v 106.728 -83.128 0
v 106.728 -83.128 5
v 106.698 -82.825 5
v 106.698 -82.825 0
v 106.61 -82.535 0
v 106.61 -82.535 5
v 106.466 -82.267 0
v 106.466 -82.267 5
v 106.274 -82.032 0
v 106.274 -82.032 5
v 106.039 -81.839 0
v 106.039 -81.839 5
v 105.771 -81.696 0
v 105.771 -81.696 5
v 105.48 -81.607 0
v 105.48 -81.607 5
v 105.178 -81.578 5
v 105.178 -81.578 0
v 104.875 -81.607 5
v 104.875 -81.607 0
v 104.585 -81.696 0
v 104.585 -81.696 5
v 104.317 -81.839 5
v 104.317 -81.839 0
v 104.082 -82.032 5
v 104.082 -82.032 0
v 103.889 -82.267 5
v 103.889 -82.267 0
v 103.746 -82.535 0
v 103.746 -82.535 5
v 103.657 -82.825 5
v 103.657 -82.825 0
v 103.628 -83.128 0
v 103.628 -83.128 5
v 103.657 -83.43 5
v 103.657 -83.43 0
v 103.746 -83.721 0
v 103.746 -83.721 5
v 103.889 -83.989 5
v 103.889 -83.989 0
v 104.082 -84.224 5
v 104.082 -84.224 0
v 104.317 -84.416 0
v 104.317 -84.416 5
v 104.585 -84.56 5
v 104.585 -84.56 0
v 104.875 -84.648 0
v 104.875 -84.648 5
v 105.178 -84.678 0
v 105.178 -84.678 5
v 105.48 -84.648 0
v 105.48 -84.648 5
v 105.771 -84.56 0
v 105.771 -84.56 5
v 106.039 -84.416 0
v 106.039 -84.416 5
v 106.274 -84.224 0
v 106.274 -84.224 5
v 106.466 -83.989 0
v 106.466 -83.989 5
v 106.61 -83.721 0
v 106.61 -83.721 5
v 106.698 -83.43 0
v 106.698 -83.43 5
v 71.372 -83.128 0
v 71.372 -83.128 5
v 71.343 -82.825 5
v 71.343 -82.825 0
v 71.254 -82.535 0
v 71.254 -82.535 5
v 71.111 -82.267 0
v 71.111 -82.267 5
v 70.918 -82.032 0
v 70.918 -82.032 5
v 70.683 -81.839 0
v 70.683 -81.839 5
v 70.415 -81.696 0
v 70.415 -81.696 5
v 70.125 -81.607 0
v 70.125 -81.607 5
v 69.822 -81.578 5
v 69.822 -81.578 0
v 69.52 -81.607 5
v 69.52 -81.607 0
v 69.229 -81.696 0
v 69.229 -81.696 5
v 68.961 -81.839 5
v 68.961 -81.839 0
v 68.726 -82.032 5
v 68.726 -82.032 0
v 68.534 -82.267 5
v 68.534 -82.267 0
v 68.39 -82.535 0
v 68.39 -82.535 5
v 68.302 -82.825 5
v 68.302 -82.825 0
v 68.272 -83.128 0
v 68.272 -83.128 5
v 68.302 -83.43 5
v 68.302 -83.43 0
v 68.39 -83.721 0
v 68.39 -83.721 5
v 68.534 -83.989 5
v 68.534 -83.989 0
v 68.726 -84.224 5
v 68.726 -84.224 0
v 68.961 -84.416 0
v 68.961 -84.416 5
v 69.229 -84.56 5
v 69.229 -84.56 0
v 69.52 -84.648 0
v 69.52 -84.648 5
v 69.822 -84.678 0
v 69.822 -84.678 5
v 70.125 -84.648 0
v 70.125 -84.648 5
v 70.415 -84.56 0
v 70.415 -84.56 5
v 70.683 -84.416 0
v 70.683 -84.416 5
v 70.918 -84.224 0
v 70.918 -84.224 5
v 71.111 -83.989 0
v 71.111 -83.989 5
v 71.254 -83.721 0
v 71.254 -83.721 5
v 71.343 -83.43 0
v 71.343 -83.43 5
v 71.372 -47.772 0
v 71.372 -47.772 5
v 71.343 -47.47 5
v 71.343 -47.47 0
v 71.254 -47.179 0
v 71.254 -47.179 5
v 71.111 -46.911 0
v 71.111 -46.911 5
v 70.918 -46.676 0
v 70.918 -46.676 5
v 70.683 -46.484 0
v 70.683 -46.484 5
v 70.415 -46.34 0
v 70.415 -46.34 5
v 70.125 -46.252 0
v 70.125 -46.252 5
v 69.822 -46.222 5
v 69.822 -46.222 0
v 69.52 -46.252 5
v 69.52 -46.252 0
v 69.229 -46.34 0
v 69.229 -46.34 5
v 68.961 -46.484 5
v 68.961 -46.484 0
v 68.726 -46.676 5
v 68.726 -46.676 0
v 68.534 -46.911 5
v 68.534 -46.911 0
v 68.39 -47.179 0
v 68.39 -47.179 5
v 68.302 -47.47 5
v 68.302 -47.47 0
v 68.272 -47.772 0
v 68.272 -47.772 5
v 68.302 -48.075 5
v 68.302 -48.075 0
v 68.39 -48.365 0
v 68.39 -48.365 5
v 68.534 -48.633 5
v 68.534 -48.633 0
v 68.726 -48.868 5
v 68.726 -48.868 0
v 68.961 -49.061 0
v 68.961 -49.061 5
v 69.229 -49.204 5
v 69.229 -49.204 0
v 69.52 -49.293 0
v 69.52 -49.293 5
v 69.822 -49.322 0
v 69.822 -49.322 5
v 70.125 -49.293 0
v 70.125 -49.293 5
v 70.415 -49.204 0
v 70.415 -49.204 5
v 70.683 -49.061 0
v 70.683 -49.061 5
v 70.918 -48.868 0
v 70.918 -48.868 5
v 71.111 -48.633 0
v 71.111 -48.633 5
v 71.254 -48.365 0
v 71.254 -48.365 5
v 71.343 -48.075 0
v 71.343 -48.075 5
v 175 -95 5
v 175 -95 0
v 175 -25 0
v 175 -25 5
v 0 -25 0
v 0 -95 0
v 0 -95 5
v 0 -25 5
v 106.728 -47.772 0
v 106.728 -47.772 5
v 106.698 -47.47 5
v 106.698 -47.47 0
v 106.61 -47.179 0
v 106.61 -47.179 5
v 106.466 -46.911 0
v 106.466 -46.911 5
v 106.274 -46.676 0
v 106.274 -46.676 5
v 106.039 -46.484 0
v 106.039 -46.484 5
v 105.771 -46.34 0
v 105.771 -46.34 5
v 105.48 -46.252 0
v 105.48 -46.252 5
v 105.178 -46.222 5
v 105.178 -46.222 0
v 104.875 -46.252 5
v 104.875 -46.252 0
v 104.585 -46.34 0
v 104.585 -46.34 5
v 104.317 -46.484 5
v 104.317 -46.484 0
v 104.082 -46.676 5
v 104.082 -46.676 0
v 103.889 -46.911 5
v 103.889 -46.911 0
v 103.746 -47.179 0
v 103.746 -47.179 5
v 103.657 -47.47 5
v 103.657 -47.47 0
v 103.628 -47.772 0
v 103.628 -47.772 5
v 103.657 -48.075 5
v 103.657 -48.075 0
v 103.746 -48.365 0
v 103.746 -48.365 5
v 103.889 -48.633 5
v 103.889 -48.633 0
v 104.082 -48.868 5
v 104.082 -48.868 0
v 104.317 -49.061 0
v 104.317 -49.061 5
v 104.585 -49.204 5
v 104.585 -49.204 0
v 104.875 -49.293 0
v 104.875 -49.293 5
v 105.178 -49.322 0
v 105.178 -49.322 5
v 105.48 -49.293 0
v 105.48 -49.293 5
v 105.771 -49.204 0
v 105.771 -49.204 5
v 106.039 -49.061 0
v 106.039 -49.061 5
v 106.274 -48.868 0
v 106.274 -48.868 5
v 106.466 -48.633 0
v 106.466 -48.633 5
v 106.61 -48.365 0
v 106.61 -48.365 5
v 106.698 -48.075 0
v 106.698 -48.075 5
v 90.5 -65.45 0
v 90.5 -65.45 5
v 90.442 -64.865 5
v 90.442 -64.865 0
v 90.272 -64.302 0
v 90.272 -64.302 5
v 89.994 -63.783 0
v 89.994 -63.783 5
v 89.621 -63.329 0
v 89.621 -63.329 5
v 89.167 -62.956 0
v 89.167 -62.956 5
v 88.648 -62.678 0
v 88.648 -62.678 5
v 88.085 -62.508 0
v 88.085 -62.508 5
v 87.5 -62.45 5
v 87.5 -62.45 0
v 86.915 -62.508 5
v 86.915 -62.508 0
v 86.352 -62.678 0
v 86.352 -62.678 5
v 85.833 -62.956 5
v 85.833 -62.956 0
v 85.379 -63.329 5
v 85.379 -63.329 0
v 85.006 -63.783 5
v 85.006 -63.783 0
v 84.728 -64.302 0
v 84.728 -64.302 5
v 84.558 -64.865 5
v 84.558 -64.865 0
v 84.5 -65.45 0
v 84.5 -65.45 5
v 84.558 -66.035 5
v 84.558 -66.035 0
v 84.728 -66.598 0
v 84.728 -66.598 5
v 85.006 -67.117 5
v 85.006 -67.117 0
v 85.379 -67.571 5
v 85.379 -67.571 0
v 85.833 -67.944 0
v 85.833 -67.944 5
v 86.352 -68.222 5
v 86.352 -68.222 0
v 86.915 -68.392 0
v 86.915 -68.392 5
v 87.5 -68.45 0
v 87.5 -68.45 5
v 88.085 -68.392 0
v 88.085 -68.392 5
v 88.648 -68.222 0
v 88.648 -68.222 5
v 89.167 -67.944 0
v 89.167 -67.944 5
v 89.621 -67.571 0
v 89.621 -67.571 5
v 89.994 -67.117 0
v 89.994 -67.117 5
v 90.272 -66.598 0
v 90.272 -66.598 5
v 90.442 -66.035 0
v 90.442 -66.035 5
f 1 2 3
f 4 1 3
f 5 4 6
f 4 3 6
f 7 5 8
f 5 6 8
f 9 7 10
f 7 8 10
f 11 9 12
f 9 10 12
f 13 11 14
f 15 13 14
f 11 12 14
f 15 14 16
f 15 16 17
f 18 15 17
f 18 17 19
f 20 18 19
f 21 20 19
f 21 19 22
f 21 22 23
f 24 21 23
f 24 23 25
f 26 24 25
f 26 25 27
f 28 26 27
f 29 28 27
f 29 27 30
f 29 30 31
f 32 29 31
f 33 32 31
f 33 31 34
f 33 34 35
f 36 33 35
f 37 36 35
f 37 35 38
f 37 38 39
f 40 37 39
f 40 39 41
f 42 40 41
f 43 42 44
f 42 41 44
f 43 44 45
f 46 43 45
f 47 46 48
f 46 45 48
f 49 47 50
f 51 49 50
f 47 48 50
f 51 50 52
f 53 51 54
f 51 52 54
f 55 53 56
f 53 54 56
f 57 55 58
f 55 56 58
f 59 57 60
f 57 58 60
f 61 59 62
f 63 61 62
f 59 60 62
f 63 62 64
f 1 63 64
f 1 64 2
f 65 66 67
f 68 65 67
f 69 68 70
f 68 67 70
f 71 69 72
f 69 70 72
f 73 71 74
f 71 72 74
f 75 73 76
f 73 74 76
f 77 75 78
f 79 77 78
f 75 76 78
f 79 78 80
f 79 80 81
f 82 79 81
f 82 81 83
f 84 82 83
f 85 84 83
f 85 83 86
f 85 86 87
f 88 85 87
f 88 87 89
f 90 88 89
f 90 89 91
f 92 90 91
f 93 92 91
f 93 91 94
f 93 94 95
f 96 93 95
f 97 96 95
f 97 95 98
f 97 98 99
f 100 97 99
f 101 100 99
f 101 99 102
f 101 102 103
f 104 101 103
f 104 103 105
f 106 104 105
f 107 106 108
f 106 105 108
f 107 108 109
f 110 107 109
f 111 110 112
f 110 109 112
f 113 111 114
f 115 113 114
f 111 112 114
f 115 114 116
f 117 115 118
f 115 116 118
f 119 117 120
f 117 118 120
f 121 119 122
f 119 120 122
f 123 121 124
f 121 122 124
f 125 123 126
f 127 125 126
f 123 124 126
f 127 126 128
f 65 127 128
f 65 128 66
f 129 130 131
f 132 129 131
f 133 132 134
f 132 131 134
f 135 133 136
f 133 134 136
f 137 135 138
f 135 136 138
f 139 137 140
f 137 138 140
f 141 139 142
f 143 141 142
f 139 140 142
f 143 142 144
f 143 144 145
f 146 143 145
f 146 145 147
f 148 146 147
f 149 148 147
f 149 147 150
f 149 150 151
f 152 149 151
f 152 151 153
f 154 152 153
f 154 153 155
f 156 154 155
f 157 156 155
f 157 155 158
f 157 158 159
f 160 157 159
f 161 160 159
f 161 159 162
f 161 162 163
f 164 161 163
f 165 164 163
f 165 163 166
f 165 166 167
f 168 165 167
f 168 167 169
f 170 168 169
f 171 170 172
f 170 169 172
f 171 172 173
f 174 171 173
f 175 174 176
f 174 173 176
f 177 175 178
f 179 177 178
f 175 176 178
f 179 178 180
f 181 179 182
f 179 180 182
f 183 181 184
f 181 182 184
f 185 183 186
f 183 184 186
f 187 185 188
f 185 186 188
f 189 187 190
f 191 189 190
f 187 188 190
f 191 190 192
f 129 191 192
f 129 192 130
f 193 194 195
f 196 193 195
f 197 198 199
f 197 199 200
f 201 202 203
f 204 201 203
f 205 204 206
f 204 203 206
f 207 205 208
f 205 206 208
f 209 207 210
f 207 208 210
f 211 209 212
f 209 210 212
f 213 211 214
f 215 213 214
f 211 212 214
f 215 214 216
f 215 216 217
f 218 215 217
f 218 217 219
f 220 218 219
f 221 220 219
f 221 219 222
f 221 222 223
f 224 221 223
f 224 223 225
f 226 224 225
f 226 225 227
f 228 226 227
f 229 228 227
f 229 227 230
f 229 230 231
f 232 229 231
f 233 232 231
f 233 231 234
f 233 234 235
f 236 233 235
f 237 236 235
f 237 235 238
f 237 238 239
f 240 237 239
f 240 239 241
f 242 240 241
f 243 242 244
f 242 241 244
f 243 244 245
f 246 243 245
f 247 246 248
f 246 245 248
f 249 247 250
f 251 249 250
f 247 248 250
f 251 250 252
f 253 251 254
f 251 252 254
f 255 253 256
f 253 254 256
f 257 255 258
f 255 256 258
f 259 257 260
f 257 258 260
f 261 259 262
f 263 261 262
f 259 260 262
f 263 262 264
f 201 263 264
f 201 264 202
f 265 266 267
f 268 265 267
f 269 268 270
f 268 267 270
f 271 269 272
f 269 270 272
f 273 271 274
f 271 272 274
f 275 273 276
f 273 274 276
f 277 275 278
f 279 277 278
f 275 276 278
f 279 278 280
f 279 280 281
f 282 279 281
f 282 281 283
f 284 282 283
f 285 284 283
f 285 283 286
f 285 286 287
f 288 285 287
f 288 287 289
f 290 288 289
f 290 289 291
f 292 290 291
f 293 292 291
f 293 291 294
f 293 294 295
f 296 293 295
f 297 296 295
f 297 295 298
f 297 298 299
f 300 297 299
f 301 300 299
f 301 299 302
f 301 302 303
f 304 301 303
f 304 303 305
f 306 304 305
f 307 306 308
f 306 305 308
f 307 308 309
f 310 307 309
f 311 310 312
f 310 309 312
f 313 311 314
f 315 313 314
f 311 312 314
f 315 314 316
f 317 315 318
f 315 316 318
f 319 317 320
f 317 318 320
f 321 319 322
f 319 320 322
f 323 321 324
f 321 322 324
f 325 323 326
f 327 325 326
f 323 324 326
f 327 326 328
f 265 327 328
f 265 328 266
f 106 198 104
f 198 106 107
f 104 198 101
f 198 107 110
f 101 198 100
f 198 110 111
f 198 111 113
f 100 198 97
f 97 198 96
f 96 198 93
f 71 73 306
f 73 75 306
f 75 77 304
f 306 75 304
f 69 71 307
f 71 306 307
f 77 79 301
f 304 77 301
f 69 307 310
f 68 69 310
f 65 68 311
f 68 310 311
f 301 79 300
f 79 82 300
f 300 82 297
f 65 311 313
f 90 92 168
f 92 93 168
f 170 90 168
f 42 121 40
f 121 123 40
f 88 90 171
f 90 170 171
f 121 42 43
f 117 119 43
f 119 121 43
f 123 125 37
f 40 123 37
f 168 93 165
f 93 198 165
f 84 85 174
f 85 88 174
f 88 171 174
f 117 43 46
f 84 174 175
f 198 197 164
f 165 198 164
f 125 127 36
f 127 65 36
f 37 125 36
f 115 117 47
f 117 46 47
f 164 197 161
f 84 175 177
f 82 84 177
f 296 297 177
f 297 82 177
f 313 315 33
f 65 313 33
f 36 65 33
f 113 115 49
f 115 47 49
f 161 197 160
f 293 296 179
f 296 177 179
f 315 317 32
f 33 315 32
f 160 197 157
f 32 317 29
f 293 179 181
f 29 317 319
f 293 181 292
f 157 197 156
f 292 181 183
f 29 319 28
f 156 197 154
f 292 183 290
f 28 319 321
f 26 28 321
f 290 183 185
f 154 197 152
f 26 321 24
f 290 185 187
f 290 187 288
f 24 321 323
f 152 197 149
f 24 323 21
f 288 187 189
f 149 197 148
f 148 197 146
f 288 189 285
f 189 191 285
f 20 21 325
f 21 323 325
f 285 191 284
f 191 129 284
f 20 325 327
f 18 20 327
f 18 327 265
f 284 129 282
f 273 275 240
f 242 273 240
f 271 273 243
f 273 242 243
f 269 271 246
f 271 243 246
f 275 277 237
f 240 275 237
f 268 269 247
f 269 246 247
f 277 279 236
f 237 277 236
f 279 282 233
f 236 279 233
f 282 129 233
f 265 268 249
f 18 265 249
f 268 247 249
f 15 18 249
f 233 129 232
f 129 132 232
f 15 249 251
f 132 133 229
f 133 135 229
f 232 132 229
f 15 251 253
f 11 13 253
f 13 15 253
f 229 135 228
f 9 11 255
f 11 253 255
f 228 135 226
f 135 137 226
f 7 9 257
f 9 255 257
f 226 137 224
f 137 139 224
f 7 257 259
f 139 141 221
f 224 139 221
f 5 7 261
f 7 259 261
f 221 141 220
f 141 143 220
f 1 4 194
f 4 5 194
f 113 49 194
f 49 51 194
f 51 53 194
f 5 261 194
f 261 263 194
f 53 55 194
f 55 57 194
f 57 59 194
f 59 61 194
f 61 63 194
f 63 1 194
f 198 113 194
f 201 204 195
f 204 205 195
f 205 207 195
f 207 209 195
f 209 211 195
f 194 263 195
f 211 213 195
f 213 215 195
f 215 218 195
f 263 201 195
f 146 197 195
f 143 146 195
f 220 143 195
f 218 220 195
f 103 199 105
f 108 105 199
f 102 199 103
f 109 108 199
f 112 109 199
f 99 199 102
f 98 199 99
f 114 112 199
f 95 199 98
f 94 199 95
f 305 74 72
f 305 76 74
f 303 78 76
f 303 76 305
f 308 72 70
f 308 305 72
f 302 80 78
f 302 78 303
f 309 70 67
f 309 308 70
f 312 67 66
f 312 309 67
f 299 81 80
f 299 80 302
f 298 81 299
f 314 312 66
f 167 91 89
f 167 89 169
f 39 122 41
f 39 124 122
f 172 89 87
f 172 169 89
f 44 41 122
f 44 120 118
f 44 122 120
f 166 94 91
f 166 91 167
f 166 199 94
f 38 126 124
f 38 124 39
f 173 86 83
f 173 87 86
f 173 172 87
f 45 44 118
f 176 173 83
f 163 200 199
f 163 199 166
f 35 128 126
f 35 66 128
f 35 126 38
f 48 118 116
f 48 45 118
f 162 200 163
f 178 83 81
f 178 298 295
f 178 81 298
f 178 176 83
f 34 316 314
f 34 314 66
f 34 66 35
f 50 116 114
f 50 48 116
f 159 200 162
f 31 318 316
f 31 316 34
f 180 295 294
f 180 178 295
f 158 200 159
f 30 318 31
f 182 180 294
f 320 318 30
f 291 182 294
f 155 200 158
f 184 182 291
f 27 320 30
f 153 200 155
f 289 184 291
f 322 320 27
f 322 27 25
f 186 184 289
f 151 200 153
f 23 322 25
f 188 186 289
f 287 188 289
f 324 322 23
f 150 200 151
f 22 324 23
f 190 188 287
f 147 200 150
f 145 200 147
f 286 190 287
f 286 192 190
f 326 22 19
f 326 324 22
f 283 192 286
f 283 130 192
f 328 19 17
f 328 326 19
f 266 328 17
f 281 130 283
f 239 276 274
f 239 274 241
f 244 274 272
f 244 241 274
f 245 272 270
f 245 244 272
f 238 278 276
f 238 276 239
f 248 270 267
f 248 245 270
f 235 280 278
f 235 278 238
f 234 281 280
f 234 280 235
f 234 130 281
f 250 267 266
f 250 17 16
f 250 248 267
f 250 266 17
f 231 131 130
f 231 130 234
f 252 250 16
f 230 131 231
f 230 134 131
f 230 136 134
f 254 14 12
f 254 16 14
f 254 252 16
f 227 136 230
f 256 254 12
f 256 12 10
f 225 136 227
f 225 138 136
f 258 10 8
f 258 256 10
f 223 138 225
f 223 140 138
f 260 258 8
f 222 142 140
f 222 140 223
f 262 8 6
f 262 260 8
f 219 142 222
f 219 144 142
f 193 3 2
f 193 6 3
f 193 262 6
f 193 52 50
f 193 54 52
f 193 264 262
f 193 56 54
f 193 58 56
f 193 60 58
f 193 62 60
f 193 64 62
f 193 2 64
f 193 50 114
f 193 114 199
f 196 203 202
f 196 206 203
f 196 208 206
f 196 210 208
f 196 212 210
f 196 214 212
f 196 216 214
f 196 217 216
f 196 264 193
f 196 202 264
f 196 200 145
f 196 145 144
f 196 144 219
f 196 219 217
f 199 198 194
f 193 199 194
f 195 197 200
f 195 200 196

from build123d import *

# Parameters (mm, degrees)
SKETCH_1_W          = 175
SKETCH_1_H          = 70
EXTRUDE_1_DEPTH     = 5
SKETCH_2_R          = 3
SKETCH_2_R_2        = 1.55
CUT_EXTRUDE_1_DEPTH = 10


with BuildPart() as part:
    # 草图1 → 凸台-拉伸1 (new body)
    with BuildSketch(Plane.XY):
        with Locations((87.5, -60)):
            Rectangle(SKETCH_1_W, SKETCH_1_H)
    extrude(amount=EXTRUDE_1_DEPTH)

    # 草图2 → 切除-拉伸1 (cut)
    with BuildSketch(Plane.XY.offset(5)):
        with Locations((87.5, -65.45)):
            Circle(SKETCH_2_R)
        with Locations((69.82233047, -47.77233047)):
            Circle(SKETCH_2_R_2)
        with Locations((105.17766953, -47.77233047)):
            Circle(SKETCH_2_R_2)
        with Locations((105.17766953, -83.12766953)):
            Circle(SKETCH_2_R_2)
        with Locations((69.82233047, -83.12766953)):
            Circle(SKETCH_2_R_2)
    extrude(amount=-CUT_EXTRUDE_1_DEPTH, mode=Mode.SUBTRACT)


solid = part.part
